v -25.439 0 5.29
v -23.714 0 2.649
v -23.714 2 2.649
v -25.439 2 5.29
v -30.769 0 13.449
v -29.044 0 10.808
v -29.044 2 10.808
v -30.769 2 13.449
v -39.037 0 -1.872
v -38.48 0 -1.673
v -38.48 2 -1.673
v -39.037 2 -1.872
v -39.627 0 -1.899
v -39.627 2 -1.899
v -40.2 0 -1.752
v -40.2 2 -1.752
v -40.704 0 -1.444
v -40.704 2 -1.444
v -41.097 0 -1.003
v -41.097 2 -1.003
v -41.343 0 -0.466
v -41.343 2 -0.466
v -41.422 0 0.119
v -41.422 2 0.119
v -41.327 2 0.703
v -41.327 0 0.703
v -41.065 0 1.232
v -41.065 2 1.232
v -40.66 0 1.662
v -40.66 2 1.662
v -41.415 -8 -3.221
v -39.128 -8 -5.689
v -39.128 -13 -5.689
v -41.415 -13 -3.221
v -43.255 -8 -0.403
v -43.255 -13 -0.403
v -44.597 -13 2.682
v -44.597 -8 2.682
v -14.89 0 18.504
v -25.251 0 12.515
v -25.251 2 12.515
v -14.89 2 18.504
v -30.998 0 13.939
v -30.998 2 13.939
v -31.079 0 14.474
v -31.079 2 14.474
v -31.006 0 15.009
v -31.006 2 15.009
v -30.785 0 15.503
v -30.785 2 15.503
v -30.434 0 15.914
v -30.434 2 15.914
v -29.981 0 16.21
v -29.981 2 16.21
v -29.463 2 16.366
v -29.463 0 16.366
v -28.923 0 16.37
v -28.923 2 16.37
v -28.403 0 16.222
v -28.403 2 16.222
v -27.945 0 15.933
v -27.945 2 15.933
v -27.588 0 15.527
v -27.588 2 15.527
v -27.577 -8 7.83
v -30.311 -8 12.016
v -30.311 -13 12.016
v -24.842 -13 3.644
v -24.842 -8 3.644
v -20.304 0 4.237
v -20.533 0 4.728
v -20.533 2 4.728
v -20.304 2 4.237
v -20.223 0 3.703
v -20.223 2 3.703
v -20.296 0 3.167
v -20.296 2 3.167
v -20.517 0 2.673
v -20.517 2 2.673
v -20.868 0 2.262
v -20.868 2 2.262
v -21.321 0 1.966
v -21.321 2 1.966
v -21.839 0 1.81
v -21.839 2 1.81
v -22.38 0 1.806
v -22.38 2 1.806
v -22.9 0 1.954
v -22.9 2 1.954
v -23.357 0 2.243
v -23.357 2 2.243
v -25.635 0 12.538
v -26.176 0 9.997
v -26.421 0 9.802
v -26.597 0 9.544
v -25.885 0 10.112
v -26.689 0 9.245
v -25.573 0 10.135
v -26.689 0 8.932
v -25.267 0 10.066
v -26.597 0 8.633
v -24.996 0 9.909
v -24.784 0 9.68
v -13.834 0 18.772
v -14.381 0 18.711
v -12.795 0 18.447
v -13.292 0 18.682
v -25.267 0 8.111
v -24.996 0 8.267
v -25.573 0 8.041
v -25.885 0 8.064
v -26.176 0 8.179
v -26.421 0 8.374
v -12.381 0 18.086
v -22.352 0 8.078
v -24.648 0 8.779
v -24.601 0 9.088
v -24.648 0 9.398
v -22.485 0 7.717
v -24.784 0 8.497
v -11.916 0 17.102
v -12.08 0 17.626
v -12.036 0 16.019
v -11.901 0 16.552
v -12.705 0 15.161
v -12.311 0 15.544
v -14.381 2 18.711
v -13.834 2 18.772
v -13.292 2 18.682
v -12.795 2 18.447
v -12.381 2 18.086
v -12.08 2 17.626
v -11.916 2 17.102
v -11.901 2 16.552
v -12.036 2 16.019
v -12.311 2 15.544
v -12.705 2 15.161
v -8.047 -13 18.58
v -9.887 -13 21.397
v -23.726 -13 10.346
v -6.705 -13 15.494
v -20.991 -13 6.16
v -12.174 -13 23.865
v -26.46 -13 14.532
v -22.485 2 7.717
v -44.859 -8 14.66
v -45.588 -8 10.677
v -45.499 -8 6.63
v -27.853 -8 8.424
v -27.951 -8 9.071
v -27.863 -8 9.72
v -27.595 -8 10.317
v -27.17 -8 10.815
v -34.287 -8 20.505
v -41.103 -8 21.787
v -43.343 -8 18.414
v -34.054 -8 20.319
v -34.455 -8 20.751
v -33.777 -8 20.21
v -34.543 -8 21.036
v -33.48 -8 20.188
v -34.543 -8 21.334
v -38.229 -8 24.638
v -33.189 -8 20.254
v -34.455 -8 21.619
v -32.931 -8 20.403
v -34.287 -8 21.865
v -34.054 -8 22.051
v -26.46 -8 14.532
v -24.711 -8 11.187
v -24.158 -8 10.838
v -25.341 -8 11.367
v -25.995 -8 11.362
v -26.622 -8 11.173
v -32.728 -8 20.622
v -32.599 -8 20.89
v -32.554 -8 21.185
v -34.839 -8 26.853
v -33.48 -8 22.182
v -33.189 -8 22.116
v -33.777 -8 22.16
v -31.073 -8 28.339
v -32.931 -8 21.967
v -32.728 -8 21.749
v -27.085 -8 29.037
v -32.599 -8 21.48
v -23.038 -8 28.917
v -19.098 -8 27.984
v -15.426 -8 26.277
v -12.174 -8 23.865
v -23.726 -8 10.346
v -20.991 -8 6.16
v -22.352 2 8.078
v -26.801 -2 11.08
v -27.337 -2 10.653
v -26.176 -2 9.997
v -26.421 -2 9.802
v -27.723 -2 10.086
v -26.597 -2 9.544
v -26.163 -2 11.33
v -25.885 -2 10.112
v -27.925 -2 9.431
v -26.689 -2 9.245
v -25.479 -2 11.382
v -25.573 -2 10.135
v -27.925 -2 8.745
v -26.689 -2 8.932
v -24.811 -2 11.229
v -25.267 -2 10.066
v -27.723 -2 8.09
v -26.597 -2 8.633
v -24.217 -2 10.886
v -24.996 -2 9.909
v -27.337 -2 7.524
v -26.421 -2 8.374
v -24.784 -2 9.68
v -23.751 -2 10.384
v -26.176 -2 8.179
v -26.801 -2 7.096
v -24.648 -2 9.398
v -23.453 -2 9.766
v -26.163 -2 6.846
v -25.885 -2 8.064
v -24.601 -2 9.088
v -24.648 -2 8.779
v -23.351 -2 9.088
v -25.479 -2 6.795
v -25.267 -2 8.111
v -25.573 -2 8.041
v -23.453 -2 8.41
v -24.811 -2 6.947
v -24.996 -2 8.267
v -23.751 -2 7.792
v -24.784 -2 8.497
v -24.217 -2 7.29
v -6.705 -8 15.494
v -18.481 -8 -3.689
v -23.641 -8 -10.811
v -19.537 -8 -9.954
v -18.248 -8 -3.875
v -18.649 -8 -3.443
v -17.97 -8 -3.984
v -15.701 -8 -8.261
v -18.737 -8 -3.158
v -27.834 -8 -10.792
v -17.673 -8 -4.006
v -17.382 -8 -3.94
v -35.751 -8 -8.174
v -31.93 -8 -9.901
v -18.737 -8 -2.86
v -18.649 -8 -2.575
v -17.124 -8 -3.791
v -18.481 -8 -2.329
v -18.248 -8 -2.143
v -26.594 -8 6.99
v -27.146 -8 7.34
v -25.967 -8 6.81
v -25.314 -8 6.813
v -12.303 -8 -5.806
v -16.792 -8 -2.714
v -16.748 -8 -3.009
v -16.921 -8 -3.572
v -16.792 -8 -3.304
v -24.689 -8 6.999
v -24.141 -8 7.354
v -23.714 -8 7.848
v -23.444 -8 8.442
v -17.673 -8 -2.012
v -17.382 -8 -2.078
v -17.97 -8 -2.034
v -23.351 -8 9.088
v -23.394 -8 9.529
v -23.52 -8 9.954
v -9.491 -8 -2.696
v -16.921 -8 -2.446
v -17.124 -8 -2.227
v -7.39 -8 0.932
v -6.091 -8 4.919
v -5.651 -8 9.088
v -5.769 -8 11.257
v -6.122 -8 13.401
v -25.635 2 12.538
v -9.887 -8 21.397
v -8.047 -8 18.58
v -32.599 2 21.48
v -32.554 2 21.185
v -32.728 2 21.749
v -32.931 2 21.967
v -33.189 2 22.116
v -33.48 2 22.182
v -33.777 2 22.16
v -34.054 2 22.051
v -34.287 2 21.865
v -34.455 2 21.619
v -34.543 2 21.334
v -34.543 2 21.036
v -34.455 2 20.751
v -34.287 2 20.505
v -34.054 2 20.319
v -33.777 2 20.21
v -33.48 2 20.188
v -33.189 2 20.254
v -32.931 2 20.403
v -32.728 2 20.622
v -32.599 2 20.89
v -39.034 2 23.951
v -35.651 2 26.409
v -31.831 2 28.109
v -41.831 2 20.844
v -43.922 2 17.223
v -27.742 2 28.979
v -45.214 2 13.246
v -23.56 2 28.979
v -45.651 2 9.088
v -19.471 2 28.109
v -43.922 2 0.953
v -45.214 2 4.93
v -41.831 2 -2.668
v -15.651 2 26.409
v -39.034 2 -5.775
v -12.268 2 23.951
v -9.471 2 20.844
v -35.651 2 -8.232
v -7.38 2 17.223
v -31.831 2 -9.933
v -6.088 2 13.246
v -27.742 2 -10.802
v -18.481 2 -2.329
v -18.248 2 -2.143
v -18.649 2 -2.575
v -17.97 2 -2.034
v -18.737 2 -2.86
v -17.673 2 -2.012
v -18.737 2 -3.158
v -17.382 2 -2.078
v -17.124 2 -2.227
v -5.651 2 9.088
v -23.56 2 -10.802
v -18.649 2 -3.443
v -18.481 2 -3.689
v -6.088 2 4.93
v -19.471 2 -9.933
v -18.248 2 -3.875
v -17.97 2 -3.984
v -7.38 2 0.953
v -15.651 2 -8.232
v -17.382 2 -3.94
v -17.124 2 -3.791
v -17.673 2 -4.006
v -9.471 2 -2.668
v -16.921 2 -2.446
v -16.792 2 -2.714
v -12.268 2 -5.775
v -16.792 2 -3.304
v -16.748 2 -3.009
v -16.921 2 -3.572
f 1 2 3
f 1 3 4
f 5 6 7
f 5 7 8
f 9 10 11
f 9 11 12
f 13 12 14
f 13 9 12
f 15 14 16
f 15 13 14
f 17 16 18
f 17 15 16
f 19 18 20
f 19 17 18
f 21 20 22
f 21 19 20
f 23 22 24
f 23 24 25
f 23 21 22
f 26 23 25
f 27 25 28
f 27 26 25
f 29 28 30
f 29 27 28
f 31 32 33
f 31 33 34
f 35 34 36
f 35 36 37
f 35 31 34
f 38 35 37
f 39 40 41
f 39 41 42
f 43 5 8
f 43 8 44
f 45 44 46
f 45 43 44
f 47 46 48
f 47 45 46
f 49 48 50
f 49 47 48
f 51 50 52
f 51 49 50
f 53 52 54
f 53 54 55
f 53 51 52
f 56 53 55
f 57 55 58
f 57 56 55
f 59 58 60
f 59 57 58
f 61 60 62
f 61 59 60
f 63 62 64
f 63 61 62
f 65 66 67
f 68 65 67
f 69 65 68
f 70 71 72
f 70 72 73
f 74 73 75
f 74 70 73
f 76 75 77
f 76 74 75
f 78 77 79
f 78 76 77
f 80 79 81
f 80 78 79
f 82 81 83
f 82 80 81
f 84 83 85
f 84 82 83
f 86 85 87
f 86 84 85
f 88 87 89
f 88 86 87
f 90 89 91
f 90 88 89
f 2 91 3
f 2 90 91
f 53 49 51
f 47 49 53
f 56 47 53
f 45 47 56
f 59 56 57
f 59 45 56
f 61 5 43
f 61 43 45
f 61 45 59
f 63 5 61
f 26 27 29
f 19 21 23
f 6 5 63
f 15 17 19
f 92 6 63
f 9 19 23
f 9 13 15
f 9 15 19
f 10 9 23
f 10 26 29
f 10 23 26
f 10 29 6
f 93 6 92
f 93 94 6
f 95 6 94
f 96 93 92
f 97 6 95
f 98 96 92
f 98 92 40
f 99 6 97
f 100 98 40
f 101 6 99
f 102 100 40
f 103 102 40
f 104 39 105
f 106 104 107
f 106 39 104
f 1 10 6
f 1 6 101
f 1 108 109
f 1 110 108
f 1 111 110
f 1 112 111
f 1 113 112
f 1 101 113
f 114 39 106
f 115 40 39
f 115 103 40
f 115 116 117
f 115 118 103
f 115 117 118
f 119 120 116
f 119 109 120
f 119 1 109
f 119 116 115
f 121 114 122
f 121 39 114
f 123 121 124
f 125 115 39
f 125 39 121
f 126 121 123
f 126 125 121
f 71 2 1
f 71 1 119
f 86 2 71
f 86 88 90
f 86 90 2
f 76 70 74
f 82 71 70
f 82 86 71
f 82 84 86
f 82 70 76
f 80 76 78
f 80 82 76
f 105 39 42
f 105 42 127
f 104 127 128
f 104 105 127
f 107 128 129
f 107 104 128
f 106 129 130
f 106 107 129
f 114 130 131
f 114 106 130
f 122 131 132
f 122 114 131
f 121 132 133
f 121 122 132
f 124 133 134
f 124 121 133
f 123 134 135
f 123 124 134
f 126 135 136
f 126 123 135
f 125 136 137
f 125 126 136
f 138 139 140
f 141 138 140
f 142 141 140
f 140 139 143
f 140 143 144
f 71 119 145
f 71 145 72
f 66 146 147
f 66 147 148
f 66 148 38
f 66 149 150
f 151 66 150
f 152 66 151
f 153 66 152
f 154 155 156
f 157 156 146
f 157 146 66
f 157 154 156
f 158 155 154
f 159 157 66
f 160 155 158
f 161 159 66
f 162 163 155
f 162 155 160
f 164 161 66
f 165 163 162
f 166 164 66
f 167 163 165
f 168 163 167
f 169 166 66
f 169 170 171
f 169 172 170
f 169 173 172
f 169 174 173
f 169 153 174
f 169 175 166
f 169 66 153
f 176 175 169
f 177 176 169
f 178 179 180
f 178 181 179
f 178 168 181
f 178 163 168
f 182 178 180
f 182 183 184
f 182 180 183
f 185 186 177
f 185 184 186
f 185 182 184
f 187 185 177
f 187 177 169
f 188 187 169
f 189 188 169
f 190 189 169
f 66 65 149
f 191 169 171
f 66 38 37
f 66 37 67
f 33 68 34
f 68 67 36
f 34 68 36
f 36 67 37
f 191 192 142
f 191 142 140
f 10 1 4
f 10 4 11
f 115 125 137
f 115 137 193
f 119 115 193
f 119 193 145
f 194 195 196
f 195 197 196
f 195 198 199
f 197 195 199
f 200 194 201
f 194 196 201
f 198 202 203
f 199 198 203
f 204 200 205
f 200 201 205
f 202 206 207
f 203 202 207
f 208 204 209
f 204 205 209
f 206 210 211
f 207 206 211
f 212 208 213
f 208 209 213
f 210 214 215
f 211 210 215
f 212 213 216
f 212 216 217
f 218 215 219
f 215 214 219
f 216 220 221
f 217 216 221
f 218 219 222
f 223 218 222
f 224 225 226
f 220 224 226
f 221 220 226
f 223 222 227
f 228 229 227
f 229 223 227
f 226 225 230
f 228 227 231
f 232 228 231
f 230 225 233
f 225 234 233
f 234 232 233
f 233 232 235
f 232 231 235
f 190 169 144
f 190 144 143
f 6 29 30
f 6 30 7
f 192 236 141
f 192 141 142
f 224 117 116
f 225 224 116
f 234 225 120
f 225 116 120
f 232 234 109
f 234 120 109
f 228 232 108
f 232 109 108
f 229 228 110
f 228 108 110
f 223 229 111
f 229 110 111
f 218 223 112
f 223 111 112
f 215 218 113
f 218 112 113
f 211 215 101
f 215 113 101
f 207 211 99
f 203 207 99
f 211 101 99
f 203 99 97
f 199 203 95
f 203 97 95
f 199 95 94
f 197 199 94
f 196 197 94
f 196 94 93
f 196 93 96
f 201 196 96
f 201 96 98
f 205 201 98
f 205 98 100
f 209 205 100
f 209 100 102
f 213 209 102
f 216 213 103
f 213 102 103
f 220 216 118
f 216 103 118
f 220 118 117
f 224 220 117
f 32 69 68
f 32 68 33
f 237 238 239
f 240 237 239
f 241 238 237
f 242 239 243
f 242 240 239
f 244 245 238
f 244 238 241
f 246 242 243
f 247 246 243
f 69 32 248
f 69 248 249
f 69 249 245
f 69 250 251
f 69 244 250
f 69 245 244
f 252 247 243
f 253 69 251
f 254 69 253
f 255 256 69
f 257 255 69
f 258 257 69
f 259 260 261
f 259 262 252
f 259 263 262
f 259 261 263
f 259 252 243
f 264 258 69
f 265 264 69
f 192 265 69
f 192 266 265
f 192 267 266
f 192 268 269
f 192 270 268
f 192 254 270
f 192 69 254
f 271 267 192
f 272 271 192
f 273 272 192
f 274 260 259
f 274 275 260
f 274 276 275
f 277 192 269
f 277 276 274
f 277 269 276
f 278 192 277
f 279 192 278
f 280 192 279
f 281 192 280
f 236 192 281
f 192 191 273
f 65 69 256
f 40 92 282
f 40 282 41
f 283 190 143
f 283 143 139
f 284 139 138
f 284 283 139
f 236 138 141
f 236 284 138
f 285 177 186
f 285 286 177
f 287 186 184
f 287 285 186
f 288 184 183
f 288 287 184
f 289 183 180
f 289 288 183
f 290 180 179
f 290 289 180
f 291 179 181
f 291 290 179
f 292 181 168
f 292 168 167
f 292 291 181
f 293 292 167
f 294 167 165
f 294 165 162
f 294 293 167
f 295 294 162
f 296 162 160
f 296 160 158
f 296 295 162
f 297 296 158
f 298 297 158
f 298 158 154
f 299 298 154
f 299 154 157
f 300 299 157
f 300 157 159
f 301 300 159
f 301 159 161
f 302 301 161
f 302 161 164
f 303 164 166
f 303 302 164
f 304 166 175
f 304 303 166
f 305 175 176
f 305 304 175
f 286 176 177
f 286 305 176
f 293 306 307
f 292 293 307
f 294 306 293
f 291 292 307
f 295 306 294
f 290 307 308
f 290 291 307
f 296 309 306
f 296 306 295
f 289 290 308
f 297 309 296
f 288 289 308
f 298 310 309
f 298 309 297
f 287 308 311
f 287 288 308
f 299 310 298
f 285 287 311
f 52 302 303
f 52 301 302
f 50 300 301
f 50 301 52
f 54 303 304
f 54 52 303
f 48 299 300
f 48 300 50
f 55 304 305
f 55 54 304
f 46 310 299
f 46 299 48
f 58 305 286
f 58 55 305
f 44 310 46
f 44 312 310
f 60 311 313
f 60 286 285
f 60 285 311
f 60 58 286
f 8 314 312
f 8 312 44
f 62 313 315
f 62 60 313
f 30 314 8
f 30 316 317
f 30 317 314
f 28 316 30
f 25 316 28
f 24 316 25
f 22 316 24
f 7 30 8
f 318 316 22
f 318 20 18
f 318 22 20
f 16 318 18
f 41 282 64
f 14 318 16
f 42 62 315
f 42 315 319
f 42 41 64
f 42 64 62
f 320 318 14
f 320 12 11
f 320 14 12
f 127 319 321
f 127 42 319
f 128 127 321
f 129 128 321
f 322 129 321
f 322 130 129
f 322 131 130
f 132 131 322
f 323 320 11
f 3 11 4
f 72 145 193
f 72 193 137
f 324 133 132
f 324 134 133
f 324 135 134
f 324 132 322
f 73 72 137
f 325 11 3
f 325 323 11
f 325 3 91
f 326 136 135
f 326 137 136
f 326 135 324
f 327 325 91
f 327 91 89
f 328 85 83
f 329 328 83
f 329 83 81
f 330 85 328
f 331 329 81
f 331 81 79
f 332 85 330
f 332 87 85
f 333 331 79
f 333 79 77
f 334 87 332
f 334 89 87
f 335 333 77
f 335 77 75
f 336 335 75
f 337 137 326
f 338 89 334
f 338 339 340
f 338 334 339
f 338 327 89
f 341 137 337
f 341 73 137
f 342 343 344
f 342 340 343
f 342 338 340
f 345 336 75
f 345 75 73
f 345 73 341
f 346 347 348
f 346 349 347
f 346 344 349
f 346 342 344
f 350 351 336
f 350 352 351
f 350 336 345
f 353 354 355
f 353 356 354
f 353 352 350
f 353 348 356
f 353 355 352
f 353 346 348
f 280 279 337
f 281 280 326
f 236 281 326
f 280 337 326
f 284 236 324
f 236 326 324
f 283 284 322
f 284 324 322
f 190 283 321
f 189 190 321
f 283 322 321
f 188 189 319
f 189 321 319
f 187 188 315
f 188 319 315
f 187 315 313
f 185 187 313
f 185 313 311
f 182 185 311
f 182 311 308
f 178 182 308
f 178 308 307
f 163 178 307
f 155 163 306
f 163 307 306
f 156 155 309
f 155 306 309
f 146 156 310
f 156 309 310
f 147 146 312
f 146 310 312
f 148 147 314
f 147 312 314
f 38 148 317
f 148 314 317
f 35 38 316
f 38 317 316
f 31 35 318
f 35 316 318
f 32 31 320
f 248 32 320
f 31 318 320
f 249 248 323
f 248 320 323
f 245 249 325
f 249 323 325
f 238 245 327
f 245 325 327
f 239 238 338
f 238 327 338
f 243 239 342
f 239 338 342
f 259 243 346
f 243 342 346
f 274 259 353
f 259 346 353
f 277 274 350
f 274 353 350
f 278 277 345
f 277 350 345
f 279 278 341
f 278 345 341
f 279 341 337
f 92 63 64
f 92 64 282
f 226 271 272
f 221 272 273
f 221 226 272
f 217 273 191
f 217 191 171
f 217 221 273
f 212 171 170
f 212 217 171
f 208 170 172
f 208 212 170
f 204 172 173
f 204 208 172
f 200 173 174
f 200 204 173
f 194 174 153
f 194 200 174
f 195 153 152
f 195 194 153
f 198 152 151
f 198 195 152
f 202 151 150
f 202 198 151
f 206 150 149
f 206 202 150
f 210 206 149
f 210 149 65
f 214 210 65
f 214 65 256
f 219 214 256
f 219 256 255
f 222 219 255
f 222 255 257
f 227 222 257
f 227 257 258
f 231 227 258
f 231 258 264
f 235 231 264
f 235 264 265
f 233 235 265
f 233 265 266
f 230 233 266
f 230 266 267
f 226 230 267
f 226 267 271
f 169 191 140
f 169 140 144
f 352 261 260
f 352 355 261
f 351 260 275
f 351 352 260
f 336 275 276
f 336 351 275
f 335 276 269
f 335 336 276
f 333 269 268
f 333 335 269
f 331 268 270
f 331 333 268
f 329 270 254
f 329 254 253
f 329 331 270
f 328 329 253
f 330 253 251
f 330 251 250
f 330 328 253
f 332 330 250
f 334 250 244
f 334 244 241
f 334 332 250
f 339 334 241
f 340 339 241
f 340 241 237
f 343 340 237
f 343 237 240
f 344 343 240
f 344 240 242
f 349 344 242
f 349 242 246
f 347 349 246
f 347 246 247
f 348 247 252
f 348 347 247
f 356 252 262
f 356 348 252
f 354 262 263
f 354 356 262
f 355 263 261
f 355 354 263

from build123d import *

# Parameters (mm, degrees)
SKETCH1_R           = 20
SKETCH1_R_2         = 1
BOSS_EXTRUDE1_DEPTH = 2
SKETCH2_R           = 20
SKETCH2_R_2         = 1
SKETCH2_R_3         = 2.3
BOSS_EXTRUDE3_DEPTH = 8
BOSS_EXTRUDE4_DEPTH = 5
SKETCH4_R           = 2.3
SKETCH4_R_2         = 1.05
BOSS_EXTRUDE5_DEPTH = 2
SKETCH5_R           = 0.740059644
CUT_EXTRUDE1_DEPTH  = 6


with BuildPart() as part:
    # Sketch1 → Boss-Extrude1 (new body)
    with BuildSketch(Plane(origin=(0, 0, 0), x_dir=(1, 0, 0), z_dir=(0, 1, 0))):
        with Locations((-25.651058935, -9.088114724)):
            Circle(SKETCH1_R)
        with Locations((-17.747716132, 3.008978834)):
            Circle(SKETCH1_R_2, mode=Mode.SUBTRACT)
        with Locations((-33.554401738, -21.185208281)):
            Circle(SKETCH1_R_2, mode=Mode.SUBTRACT)
        with BuildLine():
            ThreePointArc((-20.532647943, -4.727567864), (-21.084075378, -2.097752703), (-23.713890539, -2.649180137))
            Line((-23.713890539, -2.649180137), (-25.439308031, -5.290155905))
            Line((-25.439308031, -5.290155905), (-38.480446345, 1.673359092))
            ThreePointArc((-38.480446345, 1.673359092), (-41.09682891, 1.003004634), (-40.659707143, -1.662282853))
            Line((-40.659707143, -1.662282853), (-29.044052435, -10.807685815))
            Line((-29.044052435, -10.807685815), (-30.769469927, -13.448661583))
            ThreePointArc((-30.769469927, -13.448661583), (-30.218042492, -16.078476745), (-27.588227331, -15.52704931))
            Line((-27.588227331, -15.52704931), (-25.63545633, -12.538079442))
            Line((-25.63545633, -12.538079442), (-25.251093904, -12.514851944))
            Line((-25.251093904, -12.514851944), (-14.889738345, -18.504207673))
            ThreePointArc((-14.889738345, -18.504207673), (-12.21449481, -17.866568148), (-12.705220614, -15.16051931))
            Line((-12.705220614, -15.16051931), (-22.35228997, -8.077855691))
            Line((-22.35228997, -8.077855691), (-22.485418943, -7.716537732))
            Line((-22.485418943, -7.716537732), (-20.532647943, -4.727567864))
        make_face(mode=Mode.SUBTRACT)
    extrude(amount=BOSS_EXTRUDE1_DEPTH)

    # Sketch2 → Boss-Extrude3 (add)
    with BuildSketch(Plane.XZ):
        with Locations((-25.651058935, 9.088114724)):
            Circle(SKETCH2_R)
        with Locations((-17.747716132, -3.008978834)):
            Circle(SKETCH2_R_2, mode=Mode.SUBTRACT)
        with Locations((-33.554401738, 21.185208281)):
            Circle(SKETCH2_R_2, mode=Mode.SUBTRACT)
        with Locations((-25.651058935, 9.088114724)):
            Circle(SKETCH2_R_3, mode=Mode.SUBTRACT)
    extrude(amount=BOSS_EXTRUDE3_DEPTH)

    # Sketch3 → Boss-Extrude4 (add)
    with BuildSketch(Plane.XZ.offset(8)):
        with BuildLine():
            Line((-23.725569995, 10.346086242), (-26.460290688, 14.531931764))
            Line((-26.460290688, 14.531931764), (-12.174069633, 23.865487946))
            ThreePointArc((-12.174069633, 23.865487946), (-8.907676848, 20.026997496), (-6.704628247, 15.493796903))
            Line((-6.704628247, 15.493796903), (-20.990849302, 6.160240721))
            Line((-20.990849302, 6.160240721), (-23.725569995, 10.346086242))
        make_face()
        with BuildLine():
            Line((-27.576547875, 7.830143205), (-24.841827182, 3.644297683))
            Line((-24.841827182, 3.644297683), (-39.128048237, -5.689258499))
            ThreePointArc((-39.128048237, -5.689258499), (-42.394441021, -1.850768048), (-44.597489623, 2.682432545))
            Line((-44.597489623, 2.682432545), (-30.311268568, 12.015988727))
            Line((-30.311268568, 12.015988727), (-27.576547875, 7.830143205))
        make_face()
    extrude(amount=BOSS_EXTRUDE4_DEPTH)

    # Sketch4 → Boss-Extrude5 (add)
    with BuildSketch(Plane(origin=(0, 0, 0), x_dir=(1, 0, 0), z_dir=(0, 1, 0))):
        with Locations((-25.651058935, -9.088114724)):
            Circle(SKETCH4_R)
        with Locations((-25.651058935, -9.088114724)):
            Circle(SKETCH4_R_2, mode=Mode.SUBTRACT)
    extrude(amount=-BOSS_EXTRUDE5_DEPTH)

    # Sketch5 → Cut-Extrude1 (cut)
    with BuildSketch(Plane(origin=(0, 2, 0), x_dir=(1, 0, 0), z_dir=(0, 1, 0))):
        with Locations((-20.12753999, 54.77317824)):
            Circle(SKETCH5_R)
    extrude(amount=-CUT_EXTRUDE1_DEPTH, mode=Mode.SUBTRACT)


solid = part.part
